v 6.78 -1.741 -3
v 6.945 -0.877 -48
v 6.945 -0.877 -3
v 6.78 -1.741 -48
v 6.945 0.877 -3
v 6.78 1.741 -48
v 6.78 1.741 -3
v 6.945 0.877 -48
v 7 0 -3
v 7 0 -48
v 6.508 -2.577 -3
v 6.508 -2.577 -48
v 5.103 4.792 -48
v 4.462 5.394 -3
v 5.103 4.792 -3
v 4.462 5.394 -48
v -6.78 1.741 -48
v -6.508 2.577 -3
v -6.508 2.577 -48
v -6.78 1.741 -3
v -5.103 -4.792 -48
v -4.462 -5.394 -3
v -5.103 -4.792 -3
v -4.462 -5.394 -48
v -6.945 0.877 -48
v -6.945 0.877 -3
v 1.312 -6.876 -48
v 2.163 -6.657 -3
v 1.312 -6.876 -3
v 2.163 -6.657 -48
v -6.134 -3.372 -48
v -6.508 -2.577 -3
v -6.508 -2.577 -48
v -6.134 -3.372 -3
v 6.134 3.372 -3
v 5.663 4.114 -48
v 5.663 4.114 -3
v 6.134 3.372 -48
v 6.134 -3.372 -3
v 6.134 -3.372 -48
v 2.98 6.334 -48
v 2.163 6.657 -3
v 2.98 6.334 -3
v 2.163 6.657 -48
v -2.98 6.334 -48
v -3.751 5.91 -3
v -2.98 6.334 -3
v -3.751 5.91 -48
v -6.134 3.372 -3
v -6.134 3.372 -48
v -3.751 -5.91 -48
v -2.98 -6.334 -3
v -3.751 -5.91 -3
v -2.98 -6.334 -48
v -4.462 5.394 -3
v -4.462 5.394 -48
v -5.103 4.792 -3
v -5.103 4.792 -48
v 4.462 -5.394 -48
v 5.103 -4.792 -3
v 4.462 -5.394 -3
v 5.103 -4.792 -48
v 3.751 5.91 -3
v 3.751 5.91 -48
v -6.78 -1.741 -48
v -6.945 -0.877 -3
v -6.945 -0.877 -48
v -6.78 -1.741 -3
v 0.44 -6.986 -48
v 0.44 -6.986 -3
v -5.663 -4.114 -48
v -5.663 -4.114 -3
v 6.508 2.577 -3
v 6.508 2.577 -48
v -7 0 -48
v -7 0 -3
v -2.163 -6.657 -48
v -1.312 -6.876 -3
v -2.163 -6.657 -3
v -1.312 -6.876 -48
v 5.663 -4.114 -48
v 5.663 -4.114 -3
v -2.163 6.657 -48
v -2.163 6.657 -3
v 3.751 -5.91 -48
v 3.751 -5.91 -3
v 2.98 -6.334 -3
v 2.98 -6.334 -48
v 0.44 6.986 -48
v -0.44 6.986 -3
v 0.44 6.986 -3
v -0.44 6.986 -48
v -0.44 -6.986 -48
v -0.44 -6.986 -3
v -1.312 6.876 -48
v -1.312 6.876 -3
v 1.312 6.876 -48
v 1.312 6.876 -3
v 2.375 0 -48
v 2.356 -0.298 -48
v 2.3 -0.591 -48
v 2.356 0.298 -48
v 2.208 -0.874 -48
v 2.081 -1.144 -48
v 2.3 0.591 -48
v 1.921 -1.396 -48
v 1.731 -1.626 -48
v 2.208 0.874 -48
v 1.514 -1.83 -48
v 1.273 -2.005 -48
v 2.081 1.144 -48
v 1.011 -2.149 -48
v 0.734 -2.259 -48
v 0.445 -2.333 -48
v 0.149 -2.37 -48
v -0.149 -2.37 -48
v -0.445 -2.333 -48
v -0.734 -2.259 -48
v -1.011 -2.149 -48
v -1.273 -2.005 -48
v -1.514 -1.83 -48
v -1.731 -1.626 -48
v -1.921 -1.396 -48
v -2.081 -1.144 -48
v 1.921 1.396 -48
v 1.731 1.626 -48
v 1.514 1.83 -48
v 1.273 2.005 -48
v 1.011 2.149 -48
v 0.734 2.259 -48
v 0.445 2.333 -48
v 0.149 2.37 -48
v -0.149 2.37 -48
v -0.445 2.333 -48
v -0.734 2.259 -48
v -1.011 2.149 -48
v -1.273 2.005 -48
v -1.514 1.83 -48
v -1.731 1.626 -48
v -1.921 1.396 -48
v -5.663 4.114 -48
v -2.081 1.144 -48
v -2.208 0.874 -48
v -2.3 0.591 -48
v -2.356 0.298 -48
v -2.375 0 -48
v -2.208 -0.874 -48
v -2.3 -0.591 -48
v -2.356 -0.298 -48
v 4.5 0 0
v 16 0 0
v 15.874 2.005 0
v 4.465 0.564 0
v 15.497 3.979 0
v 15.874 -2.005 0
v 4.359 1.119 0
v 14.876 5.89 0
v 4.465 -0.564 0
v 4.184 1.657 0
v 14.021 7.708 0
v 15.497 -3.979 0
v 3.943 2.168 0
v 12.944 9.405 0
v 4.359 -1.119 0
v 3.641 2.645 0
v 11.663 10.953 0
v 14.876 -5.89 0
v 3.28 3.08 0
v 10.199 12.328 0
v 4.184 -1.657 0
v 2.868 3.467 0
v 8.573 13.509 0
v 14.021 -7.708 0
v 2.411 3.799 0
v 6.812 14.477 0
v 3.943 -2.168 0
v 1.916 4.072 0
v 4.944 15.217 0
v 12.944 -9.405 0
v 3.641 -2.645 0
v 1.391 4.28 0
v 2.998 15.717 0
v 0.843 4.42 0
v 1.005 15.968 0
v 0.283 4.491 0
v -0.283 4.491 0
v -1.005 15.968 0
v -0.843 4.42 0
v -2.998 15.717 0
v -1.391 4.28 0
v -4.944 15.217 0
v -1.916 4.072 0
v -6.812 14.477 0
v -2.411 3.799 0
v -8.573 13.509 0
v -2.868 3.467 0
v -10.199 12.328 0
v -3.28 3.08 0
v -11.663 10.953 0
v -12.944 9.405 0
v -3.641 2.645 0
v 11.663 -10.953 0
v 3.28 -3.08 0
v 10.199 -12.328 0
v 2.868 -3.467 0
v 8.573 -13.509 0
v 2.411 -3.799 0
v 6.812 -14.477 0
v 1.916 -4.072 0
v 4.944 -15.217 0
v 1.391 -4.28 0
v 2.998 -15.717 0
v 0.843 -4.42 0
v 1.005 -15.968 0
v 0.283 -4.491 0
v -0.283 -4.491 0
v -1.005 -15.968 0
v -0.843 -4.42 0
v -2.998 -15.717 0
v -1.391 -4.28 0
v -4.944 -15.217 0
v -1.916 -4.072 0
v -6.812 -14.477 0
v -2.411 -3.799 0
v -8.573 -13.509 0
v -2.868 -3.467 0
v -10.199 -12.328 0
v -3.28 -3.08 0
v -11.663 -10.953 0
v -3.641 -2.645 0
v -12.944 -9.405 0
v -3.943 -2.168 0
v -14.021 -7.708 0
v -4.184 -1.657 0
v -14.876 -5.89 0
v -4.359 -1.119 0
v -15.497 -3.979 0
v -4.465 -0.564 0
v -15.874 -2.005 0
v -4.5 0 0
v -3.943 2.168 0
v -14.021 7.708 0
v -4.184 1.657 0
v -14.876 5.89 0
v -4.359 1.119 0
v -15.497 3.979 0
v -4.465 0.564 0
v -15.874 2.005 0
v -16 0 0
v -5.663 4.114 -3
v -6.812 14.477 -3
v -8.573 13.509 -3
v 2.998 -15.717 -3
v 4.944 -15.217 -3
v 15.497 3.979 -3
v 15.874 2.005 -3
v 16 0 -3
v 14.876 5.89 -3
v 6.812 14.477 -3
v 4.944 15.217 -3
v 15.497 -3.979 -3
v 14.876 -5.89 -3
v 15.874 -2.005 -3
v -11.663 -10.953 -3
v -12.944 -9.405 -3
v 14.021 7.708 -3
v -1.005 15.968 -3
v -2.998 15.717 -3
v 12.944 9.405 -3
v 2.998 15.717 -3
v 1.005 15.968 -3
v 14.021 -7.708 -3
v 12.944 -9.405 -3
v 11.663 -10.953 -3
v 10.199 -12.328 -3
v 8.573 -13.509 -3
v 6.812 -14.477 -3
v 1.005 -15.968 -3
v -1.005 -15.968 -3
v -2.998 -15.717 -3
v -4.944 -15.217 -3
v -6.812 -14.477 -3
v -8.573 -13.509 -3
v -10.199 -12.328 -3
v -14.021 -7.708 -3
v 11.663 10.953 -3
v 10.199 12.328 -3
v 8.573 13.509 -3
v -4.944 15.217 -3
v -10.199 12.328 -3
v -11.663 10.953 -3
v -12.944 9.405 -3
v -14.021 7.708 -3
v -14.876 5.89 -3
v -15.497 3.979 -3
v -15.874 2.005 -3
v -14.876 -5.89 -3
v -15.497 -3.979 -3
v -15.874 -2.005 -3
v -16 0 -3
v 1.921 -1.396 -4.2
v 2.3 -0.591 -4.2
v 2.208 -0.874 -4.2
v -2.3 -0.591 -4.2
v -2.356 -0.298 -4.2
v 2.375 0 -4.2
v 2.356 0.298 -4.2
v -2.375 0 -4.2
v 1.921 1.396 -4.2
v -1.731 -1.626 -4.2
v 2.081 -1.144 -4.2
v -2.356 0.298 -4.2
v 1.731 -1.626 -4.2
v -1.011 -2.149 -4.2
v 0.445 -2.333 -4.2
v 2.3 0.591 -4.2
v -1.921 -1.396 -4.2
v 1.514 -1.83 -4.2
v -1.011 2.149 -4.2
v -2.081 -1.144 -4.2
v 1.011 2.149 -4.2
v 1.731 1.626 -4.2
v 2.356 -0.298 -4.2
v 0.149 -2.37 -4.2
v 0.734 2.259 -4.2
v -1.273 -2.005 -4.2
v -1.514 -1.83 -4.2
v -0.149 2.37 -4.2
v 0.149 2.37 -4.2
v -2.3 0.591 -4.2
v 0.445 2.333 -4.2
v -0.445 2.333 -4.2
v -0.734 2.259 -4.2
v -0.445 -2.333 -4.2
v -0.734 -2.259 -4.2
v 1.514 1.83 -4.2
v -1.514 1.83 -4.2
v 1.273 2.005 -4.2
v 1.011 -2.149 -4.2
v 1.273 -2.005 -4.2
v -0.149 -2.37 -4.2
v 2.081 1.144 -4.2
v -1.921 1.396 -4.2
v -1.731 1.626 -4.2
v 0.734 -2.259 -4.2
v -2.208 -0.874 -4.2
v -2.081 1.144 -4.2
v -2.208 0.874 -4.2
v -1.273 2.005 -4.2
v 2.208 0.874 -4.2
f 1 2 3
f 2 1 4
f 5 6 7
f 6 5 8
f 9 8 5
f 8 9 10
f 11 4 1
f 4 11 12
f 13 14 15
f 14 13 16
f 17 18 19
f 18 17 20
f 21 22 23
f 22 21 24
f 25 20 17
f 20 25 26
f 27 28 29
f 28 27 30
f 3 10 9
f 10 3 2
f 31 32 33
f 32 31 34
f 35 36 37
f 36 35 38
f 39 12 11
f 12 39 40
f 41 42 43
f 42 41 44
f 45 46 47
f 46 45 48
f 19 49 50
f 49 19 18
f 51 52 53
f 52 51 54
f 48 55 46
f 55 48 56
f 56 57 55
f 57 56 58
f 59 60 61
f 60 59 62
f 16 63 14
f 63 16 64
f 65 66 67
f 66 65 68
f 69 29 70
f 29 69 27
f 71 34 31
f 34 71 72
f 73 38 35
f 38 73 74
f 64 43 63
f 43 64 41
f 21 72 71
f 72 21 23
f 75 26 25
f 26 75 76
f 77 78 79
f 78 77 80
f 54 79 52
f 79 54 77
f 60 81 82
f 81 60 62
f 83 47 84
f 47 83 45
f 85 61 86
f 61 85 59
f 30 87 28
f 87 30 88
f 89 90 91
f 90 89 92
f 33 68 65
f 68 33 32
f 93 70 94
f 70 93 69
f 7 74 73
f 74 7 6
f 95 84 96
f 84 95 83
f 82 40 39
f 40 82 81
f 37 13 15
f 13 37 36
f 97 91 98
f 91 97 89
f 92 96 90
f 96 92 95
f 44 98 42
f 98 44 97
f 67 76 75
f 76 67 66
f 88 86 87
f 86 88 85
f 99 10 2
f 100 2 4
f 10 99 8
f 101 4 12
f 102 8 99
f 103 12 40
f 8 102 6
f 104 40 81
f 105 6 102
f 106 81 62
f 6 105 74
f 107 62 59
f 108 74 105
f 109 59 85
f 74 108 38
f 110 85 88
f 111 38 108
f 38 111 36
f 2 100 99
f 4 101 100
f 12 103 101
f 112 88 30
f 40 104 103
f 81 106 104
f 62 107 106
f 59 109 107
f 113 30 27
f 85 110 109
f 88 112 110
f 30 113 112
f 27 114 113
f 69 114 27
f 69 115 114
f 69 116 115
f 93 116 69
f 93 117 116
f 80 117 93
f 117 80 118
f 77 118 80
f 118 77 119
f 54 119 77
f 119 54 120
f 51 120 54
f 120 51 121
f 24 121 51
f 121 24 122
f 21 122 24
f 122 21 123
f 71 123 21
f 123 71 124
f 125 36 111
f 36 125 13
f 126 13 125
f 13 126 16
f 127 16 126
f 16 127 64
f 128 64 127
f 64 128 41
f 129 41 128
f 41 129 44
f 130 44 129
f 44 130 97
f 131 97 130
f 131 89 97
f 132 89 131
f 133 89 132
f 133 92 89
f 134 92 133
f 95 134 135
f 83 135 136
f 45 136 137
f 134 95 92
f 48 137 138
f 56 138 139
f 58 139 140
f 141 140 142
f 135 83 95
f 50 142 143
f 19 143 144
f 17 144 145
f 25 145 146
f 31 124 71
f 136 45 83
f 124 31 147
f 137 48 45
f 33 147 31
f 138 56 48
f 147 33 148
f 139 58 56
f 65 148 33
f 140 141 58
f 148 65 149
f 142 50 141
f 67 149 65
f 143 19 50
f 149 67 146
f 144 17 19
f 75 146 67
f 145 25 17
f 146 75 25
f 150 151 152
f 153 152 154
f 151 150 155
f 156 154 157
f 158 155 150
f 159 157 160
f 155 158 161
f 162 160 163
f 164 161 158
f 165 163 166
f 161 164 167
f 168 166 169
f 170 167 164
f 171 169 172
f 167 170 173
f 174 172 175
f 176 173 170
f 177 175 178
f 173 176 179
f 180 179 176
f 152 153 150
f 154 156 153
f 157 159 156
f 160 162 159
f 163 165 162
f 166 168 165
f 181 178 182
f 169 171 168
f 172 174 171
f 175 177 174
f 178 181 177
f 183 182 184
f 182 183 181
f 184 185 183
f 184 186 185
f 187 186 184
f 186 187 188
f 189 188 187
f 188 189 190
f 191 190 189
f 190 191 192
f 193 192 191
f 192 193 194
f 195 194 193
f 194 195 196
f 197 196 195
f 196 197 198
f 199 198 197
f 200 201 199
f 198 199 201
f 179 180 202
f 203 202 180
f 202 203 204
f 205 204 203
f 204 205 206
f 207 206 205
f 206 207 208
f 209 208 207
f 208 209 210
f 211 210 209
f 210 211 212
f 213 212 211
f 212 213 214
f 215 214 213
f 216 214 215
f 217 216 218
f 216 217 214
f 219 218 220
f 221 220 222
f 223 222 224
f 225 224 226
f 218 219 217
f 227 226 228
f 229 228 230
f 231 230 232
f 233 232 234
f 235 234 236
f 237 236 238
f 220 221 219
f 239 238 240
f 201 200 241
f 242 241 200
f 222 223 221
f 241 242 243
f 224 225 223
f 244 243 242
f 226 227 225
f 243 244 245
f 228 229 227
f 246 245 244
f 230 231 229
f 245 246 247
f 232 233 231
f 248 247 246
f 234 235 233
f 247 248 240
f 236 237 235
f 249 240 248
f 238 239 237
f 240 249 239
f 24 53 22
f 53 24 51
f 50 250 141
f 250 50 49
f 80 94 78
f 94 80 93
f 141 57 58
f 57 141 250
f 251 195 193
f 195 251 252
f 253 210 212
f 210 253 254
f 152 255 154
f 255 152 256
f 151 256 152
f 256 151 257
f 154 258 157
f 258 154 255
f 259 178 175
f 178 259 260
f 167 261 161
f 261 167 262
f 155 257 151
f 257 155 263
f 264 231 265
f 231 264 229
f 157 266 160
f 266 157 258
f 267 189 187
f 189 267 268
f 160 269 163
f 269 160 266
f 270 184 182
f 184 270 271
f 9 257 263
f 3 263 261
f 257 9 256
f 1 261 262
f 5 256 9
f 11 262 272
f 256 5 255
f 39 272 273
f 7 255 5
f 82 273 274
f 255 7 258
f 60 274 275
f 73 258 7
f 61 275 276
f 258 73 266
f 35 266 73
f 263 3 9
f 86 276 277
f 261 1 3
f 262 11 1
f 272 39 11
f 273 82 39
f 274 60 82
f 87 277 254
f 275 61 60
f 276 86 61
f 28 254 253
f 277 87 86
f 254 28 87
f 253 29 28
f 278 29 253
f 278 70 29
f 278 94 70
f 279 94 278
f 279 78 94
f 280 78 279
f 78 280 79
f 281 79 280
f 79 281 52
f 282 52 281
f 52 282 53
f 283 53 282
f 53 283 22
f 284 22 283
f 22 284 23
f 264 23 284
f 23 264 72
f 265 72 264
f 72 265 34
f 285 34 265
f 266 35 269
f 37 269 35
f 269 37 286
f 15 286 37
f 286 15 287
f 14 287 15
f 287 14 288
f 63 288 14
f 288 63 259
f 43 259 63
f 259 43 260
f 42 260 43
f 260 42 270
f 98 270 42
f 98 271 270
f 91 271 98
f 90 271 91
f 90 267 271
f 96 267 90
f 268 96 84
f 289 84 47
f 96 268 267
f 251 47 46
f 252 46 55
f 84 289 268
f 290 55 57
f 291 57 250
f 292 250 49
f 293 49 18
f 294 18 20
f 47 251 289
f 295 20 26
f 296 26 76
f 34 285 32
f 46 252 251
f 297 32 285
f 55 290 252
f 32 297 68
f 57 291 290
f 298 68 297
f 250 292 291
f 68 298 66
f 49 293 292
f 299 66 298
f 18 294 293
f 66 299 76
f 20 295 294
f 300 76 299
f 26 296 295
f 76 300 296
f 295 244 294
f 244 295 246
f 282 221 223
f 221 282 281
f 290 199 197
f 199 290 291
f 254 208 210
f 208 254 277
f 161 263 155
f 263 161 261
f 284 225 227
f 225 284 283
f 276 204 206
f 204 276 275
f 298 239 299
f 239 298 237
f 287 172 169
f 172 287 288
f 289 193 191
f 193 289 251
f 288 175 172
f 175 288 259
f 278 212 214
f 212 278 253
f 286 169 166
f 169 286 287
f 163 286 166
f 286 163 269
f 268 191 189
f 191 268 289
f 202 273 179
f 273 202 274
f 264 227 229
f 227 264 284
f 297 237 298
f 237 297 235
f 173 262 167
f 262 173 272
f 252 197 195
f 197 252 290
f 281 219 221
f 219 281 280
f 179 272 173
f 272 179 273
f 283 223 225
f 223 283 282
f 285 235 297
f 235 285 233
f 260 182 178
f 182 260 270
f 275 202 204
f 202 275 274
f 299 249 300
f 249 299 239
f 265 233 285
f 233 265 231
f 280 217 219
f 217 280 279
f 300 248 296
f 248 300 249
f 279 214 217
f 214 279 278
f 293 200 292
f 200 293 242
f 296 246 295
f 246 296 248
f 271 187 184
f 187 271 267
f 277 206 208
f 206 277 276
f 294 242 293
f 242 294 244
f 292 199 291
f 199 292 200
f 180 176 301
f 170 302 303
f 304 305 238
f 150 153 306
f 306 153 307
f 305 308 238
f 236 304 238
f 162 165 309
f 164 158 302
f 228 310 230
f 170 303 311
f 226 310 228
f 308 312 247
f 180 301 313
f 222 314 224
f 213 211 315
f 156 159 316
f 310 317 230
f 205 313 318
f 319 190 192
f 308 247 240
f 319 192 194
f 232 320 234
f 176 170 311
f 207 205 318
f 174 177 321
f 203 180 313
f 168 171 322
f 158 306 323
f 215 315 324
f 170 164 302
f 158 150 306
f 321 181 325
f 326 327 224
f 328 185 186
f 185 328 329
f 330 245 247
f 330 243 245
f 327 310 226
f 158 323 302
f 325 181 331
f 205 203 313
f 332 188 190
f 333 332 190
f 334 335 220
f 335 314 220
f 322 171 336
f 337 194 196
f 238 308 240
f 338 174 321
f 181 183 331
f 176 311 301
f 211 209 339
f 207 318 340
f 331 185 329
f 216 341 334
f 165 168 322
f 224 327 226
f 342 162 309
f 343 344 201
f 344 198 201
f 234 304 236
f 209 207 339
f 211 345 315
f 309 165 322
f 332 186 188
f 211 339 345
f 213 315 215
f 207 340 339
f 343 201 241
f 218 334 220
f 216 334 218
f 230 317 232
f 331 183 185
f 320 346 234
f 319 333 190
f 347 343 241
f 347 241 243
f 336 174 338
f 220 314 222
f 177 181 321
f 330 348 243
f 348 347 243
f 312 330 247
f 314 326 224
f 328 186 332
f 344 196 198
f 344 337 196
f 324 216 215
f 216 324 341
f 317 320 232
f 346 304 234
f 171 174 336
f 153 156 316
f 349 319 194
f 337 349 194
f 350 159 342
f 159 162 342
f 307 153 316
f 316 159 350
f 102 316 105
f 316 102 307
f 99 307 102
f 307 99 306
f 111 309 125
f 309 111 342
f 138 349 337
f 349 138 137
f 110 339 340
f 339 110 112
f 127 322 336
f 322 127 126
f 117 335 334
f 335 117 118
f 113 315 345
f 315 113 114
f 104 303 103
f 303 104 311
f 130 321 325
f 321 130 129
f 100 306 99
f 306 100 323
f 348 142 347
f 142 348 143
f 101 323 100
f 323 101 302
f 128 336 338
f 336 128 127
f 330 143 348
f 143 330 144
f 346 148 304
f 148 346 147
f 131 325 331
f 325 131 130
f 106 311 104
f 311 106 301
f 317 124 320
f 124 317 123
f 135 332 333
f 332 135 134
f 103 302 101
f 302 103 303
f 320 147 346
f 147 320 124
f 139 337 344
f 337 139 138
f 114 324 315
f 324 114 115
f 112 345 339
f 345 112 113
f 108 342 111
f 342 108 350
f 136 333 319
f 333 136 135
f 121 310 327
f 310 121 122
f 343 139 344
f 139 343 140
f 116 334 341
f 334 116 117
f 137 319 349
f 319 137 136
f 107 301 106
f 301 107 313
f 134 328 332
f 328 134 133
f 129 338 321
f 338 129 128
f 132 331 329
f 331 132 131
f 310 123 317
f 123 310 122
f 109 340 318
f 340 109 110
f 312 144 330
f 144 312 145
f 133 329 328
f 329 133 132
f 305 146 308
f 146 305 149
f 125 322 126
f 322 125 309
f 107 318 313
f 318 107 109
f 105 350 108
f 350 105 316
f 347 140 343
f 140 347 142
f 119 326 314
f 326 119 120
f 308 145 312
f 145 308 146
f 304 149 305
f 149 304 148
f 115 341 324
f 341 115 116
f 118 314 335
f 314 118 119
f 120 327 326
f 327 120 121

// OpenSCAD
$fn = 50;


difference() {
	union() {
		translate(v = [0, 0, -48.0000000000]) {
			cylinder(h = 48, r = 7.0000000000);
		}
		translate(v = [0, 0, -3.0000000000]) {
			cylinder(h = 3, r = 16.0000000000);
		}
	}
	union() {
		translate(v = [0, 0, 0]) {
			rotate(a = [0, 0, 0]) {
				difference() {
					union() {
						#translate(v = [0, 0, -48.0000000000]) {
							cylinder(h = 48, r = 2.2500000000);
						}
						#translate(v = [0, 0, -4.2000000000]) {
							cylinder(h = 4.2000000000, r = 7.0000000000, r1 = 2.3750000000, r2 = 4.5000000000);
						}
						#translate(v = [0, 0, -48.0000000000]) {
							cylinder(h = 48, r = 2.3750000000);
						}
						#translate(v = [0, 0, -48.0000000000]) {
							cylinder(h = 48, r = 2.2500000000);
						}
					}
					union();
				}
			}
		}
	}
}
